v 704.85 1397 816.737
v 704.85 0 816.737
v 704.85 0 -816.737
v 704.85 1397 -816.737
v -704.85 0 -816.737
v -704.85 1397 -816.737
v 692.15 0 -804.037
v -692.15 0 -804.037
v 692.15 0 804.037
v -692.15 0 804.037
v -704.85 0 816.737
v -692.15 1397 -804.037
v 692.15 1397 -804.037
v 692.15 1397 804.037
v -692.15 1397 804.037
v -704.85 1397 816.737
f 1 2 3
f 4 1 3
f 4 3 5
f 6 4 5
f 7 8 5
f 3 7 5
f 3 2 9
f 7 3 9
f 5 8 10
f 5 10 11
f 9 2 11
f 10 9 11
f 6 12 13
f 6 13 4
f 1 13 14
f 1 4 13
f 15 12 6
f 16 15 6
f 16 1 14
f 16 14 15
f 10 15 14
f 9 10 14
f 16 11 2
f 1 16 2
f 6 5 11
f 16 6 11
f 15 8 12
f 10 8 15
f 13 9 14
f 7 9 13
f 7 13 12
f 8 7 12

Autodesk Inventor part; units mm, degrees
ref_plane "YZ Plane" through (0, 0, 0) normal (1, 0, 0) x (0, 1, 0)
ref_plane "XZ Plane" through (0, 0, 0) normal (0, 1, 0) x (-1, 0, 0)
ref_plane "XY Plane" through (0, 0, 0) normal (0, 0, 1) x (1, 0, 0)
sketch "Sketch1" plane through (0, 0, 0) normal (0, 1, 0) x (-1, 0, 0)
  line L0 (704.85, 816.737) -> (-704.85, 816.737)
  line L1 (-704.85, 816.737) -> (-704.85, -816.737)
  line L2 (-704.85, -816.737) -> (704.85, -816.737)
  line L3 (704.85, -816.737) -> (704.85, 816.737)
  line L4 (704.85, 816.737) -> (-704.85, -816.737) construction
  line L5 (-704.85, 816.737) -> (704.85, -816.737) construction
  line L6 (692.15, 804.037) -> (-692.15, 804.037)
  line L7 (-692.15, 804.037) -> (-692.15, -804.037)
  line L8 (-692.15, -804.037) -> (692.15, -804.037)
  line L9 (692.15, -804.037) -> (692.15, 804.037)
  line L10 (692.15, 804.037) -> (-692.15, -804.037) construction
  line L11 (-692.15, 804.037) -> (692.15, -804.037) construction
  point P0 (0, 0)
  dimension "d0" = 1409.7
  dimension "d1" = 1633.474
  dimension "d2" = 12.7
  dimension "d3" = 12.7
extrude "Extrusion1" add sketch "Sketch1" along normal blind 1397
properties part number "AM14U3-gameVolume" material "Polycarbonate, Clear"
